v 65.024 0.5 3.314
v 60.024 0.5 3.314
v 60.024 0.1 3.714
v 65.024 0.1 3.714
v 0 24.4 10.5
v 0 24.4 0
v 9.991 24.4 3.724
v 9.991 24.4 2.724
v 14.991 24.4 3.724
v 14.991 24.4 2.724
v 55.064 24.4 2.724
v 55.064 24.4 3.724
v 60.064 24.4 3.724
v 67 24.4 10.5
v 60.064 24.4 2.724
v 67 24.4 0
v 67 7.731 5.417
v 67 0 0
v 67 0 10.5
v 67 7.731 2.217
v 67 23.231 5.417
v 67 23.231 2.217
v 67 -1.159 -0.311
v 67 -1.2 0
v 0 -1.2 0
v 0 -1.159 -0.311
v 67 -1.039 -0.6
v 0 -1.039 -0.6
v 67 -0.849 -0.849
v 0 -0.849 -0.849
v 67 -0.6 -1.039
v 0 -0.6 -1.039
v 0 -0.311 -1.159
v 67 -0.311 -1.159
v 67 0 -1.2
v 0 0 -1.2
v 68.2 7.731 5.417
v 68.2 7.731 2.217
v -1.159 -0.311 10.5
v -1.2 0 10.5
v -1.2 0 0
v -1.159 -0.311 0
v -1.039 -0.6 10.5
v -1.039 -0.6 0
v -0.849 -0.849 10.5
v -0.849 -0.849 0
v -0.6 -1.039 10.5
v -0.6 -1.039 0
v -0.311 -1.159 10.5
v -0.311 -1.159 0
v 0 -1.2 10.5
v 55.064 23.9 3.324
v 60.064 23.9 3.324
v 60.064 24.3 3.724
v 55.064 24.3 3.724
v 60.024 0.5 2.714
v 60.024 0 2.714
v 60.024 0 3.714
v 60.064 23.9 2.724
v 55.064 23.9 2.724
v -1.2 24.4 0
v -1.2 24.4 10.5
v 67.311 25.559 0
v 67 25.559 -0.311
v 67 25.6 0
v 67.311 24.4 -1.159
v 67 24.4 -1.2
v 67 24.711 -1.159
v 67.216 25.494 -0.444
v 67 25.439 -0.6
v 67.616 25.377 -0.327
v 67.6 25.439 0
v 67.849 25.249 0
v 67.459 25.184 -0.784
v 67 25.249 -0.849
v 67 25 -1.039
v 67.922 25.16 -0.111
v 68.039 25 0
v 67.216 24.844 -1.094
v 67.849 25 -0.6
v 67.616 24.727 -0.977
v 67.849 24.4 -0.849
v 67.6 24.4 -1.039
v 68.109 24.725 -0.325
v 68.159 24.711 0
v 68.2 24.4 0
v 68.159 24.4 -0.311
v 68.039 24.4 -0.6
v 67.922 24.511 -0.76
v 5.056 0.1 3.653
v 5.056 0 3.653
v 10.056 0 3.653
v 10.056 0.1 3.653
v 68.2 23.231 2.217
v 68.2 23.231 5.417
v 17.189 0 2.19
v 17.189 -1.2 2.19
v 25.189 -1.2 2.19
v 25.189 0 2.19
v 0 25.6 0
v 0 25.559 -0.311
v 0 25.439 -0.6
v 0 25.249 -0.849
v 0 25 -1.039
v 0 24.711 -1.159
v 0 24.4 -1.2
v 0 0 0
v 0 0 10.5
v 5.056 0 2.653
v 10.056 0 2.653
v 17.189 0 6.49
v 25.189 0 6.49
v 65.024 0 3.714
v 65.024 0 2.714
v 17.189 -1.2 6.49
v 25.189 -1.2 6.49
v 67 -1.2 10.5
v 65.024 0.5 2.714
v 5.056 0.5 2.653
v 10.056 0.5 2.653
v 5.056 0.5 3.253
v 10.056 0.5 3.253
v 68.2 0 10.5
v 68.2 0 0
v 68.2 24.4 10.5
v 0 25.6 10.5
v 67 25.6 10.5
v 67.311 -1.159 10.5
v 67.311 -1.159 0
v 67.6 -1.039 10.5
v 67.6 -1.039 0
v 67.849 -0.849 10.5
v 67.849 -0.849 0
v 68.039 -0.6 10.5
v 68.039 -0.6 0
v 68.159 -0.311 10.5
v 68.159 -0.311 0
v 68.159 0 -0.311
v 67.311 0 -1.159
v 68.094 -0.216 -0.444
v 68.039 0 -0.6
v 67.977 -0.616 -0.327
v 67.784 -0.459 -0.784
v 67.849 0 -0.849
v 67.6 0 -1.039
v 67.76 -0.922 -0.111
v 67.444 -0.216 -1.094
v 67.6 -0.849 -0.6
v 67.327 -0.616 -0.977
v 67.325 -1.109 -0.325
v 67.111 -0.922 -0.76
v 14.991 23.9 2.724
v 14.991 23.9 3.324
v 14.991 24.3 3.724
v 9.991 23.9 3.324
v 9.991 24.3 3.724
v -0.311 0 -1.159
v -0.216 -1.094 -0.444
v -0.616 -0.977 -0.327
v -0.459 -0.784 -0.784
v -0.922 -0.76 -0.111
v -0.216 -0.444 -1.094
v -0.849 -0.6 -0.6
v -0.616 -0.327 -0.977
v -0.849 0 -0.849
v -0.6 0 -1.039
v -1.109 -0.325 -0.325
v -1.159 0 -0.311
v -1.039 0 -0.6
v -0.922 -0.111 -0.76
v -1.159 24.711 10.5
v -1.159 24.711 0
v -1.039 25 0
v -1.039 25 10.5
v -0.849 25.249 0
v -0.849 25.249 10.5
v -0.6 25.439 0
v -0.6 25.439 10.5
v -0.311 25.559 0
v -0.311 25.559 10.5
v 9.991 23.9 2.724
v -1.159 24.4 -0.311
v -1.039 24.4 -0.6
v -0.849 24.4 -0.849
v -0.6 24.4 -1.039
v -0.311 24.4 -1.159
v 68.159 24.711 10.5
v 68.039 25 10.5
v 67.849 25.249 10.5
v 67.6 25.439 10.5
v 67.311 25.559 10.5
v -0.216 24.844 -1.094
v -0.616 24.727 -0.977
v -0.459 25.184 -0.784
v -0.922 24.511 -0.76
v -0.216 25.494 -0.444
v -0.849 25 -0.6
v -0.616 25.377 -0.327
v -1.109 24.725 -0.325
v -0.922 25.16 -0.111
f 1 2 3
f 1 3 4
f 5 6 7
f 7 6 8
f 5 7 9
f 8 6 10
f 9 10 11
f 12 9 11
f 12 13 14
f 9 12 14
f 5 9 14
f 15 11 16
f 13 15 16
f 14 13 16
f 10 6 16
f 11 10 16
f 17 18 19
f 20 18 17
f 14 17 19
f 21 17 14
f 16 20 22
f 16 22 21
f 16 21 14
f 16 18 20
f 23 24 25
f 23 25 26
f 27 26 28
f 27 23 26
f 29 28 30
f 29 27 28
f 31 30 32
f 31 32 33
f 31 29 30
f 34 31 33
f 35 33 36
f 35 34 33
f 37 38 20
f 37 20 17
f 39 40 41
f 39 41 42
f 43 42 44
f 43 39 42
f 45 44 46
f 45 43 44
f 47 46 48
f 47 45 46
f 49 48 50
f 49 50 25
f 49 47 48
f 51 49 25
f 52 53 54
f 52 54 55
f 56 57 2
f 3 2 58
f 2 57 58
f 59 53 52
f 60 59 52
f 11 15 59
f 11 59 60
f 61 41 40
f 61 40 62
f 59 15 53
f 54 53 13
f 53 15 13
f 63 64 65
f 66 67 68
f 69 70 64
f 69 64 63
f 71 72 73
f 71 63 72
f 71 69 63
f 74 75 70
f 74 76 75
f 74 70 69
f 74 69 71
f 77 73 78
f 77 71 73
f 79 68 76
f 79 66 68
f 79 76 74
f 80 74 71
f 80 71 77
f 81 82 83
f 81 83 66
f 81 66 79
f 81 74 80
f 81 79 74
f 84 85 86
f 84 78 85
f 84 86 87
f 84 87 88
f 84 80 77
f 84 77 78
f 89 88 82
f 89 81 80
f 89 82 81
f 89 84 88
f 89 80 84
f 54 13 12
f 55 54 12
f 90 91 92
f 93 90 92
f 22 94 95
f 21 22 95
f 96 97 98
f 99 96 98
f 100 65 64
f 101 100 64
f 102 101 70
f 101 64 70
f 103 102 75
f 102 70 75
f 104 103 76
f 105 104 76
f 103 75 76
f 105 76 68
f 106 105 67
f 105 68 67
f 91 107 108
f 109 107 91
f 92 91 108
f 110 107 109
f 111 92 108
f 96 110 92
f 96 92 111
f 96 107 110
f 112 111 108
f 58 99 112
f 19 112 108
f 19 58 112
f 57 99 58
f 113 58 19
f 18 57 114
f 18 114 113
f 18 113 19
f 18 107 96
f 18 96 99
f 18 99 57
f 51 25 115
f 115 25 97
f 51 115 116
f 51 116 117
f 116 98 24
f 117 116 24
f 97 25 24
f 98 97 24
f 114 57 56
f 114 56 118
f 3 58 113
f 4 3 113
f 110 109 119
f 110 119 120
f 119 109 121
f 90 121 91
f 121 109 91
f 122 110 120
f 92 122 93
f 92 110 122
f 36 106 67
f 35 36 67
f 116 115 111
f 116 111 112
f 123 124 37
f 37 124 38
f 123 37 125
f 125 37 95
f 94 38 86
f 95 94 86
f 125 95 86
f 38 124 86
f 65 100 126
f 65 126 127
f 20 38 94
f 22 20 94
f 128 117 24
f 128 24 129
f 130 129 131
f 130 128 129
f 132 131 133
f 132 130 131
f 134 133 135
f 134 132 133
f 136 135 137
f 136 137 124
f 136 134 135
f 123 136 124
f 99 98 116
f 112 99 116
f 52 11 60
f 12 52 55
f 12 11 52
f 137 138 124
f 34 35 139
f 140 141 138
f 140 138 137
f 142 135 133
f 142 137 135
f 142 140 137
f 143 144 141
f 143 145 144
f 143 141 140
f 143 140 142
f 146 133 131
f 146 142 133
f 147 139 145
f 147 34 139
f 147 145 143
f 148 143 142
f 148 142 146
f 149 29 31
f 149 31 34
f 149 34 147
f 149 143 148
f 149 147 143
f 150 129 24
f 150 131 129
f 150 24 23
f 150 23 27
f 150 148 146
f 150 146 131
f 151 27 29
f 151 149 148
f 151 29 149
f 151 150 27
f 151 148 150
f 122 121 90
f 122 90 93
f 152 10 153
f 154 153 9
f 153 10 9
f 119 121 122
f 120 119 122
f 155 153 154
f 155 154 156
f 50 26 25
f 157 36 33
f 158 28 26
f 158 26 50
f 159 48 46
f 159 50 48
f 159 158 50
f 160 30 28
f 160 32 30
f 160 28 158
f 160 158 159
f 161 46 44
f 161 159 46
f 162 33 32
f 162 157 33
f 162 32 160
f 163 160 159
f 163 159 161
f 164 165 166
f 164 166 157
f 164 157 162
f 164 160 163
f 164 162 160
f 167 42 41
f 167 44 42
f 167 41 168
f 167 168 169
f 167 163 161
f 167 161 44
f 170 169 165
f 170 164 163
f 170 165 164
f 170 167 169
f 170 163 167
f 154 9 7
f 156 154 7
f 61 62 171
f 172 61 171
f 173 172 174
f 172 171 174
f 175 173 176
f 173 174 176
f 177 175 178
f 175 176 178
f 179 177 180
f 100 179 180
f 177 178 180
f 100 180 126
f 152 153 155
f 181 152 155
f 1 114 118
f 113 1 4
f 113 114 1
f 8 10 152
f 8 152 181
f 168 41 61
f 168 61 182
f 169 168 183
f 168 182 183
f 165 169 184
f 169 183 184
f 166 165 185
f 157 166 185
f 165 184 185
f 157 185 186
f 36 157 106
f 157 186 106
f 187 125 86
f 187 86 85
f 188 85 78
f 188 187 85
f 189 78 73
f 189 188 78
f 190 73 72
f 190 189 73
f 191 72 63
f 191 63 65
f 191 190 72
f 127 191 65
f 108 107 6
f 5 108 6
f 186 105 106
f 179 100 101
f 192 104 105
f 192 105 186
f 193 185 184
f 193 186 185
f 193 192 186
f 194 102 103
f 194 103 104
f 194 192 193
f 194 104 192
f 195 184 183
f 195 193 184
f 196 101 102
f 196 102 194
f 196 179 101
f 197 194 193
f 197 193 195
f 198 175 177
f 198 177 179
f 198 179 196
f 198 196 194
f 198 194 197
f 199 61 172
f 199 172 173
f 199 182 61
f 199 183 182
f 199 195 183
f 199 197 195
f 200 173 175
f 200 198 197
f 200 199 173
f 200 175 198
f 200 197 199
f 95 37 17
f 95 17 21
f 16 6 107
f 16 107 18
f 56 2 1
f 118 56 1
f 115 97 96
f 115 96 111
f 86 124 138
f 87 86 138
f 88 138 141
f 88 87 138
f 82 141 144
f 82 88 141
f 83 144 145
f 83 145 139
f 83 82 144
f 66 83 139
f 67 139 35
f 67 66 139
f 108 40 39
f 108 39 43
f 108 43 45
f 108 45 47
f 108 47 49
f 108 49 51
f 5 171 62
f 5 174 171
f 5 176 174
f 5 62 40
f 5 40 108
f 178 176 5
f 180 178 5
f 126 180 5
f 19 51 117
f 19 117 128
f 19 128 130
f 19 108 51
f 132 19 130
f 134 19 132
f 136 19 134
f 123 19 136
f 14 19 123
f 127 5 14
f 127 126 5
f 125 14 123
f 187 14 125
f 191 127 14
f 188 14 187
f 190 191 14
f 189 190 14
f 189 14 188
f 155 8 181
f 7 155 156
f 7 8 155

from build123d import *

# Parameters (mm, degrees)
BOX_W           = 67
BOX_H           = 24.4
BOX_DEPTH       = 10.5
THICKNESS_T     = 1.2
SKETCH_W        = 8
SKETCH_H        = 4.3
POCKET_DEPTH    = 5
SKETCH001_W     = 15.5
SKETCH001_H     = 3.2
POCKET001_DEPTH = 5
SKETCH002_W     = 5
SKETCH002_H     = 1
PAD_DEPTH       = 0.5
SKETCH003_W     = 5
SKETCH003_H     = 1
PAD001_DEPTH    = 0.5
CHAMFER_SIZE    = 0.4
CHAMFER001_SIZE = 0.4
CHAMFER002_SIZE = 0.4
CHAMFER003_SIZE = 0.4


with BuildPart() as part:
    # Box → Box (new body)
    with BuildSketch(Plane.XY):
        with Locations((33.5, 12.2)):
            Rectangle(BOX_W, BOX_H)
    extrude(amount=BOX_DEPTH)

    # Thickness
    thickness_openings = [part.faces().sort_by_distance(p)[0] for p in [
        (33.5, 12.2, 10.5),
    ]]
    offset(amount=THICKNESS_T, openings=thickness_openings)

    # Sketch (on Face14 of Thickness) → Pocket (cut)
    with BuildSketch(Plane.XZ.offset(1.2)):
        with Locations((21.188957, 4.340102)):
            Rectangle(SKETCH_W, SKETCH_H)
    extrude(amount=-POCKET_DEPTH, mode=Mode.SUBTRACT)

    # Sketch001 (on Face17 of Pocket) → Pocket001 (cut)
    with BuildSketch(Plane.YZ.offset(68.2)):
        with Locations((15.481014, 3.816542)):
            Rectangle(SKETCH001_W, SKETCH001_H)
    extrude(amount=-POCKET001_DEPTH, mode=Mode.SUBTRACT)

    # Sketch002 (on Face2 of Pocket001) → Pad (join)
    with BuildSketch(Plane.XZ):
        with Locations((7.5565, 3.152776)):
            Rectangle(SKETCH002_W, SKETCH002_H)
        with Locations((62.523926, 3.21387)):
            Rectangle(SKETCH002_W, SKETCH002_H)
    extrude(amount=-PAD_DEPTH)

    # Sketch003 (on Face5 of Pad) → Pad001 (join)
    with BuildSketch(Plane(origin=(0, 24.4, 0), x_dir=(-1, 0, 0), z_dir=(0, 1, 0))):
        with Locations((-57.564125, 3.224103)):
            Rectangle(SKETCH003_W, SKETCH003_H)
        with Locations((-12.49075, 3.224103)):
            Rectangle(SKETCH003_W, SKETCH003_H)
    extrude(amount=-PAD001_DEPTH)

    # Chamfer
    chamfer_edges = [part.edges().sort_by_distance(p)[0] for p in [
        (12.49075, 23.9, 3.724103),
    ]]
    chamfer(chamfer_edges, length=CHAMFER_SIZE)

    # Chamfer001
    chamfer001_edges = [part.edges().sort_by_distance(p)[0] for p in [
        (57.564125, 23.9, 3.724103),
    ]]
    chamfer(chamfer001_edges, length=CHAMFER001_SIZE)

    # Chamfer002
    chamfer002_edges = [part.edges().sort_by_distance(p)[0] for p in [
        (62.523926, 0.5, 3.71387),
    ]]
    chamfer(chamfer002_edges, length=CHAMFER002_SIZE)

    # Chamfer003
    chamfer003_edges = [part.edges().sort_by_distance(p)[0] for p in [
        (7.5565, 0.5, 3.652776),
    ]]
    chamfer(chamfer003_edges, length=CHAMFER003_SIZE)


solid = part.part
